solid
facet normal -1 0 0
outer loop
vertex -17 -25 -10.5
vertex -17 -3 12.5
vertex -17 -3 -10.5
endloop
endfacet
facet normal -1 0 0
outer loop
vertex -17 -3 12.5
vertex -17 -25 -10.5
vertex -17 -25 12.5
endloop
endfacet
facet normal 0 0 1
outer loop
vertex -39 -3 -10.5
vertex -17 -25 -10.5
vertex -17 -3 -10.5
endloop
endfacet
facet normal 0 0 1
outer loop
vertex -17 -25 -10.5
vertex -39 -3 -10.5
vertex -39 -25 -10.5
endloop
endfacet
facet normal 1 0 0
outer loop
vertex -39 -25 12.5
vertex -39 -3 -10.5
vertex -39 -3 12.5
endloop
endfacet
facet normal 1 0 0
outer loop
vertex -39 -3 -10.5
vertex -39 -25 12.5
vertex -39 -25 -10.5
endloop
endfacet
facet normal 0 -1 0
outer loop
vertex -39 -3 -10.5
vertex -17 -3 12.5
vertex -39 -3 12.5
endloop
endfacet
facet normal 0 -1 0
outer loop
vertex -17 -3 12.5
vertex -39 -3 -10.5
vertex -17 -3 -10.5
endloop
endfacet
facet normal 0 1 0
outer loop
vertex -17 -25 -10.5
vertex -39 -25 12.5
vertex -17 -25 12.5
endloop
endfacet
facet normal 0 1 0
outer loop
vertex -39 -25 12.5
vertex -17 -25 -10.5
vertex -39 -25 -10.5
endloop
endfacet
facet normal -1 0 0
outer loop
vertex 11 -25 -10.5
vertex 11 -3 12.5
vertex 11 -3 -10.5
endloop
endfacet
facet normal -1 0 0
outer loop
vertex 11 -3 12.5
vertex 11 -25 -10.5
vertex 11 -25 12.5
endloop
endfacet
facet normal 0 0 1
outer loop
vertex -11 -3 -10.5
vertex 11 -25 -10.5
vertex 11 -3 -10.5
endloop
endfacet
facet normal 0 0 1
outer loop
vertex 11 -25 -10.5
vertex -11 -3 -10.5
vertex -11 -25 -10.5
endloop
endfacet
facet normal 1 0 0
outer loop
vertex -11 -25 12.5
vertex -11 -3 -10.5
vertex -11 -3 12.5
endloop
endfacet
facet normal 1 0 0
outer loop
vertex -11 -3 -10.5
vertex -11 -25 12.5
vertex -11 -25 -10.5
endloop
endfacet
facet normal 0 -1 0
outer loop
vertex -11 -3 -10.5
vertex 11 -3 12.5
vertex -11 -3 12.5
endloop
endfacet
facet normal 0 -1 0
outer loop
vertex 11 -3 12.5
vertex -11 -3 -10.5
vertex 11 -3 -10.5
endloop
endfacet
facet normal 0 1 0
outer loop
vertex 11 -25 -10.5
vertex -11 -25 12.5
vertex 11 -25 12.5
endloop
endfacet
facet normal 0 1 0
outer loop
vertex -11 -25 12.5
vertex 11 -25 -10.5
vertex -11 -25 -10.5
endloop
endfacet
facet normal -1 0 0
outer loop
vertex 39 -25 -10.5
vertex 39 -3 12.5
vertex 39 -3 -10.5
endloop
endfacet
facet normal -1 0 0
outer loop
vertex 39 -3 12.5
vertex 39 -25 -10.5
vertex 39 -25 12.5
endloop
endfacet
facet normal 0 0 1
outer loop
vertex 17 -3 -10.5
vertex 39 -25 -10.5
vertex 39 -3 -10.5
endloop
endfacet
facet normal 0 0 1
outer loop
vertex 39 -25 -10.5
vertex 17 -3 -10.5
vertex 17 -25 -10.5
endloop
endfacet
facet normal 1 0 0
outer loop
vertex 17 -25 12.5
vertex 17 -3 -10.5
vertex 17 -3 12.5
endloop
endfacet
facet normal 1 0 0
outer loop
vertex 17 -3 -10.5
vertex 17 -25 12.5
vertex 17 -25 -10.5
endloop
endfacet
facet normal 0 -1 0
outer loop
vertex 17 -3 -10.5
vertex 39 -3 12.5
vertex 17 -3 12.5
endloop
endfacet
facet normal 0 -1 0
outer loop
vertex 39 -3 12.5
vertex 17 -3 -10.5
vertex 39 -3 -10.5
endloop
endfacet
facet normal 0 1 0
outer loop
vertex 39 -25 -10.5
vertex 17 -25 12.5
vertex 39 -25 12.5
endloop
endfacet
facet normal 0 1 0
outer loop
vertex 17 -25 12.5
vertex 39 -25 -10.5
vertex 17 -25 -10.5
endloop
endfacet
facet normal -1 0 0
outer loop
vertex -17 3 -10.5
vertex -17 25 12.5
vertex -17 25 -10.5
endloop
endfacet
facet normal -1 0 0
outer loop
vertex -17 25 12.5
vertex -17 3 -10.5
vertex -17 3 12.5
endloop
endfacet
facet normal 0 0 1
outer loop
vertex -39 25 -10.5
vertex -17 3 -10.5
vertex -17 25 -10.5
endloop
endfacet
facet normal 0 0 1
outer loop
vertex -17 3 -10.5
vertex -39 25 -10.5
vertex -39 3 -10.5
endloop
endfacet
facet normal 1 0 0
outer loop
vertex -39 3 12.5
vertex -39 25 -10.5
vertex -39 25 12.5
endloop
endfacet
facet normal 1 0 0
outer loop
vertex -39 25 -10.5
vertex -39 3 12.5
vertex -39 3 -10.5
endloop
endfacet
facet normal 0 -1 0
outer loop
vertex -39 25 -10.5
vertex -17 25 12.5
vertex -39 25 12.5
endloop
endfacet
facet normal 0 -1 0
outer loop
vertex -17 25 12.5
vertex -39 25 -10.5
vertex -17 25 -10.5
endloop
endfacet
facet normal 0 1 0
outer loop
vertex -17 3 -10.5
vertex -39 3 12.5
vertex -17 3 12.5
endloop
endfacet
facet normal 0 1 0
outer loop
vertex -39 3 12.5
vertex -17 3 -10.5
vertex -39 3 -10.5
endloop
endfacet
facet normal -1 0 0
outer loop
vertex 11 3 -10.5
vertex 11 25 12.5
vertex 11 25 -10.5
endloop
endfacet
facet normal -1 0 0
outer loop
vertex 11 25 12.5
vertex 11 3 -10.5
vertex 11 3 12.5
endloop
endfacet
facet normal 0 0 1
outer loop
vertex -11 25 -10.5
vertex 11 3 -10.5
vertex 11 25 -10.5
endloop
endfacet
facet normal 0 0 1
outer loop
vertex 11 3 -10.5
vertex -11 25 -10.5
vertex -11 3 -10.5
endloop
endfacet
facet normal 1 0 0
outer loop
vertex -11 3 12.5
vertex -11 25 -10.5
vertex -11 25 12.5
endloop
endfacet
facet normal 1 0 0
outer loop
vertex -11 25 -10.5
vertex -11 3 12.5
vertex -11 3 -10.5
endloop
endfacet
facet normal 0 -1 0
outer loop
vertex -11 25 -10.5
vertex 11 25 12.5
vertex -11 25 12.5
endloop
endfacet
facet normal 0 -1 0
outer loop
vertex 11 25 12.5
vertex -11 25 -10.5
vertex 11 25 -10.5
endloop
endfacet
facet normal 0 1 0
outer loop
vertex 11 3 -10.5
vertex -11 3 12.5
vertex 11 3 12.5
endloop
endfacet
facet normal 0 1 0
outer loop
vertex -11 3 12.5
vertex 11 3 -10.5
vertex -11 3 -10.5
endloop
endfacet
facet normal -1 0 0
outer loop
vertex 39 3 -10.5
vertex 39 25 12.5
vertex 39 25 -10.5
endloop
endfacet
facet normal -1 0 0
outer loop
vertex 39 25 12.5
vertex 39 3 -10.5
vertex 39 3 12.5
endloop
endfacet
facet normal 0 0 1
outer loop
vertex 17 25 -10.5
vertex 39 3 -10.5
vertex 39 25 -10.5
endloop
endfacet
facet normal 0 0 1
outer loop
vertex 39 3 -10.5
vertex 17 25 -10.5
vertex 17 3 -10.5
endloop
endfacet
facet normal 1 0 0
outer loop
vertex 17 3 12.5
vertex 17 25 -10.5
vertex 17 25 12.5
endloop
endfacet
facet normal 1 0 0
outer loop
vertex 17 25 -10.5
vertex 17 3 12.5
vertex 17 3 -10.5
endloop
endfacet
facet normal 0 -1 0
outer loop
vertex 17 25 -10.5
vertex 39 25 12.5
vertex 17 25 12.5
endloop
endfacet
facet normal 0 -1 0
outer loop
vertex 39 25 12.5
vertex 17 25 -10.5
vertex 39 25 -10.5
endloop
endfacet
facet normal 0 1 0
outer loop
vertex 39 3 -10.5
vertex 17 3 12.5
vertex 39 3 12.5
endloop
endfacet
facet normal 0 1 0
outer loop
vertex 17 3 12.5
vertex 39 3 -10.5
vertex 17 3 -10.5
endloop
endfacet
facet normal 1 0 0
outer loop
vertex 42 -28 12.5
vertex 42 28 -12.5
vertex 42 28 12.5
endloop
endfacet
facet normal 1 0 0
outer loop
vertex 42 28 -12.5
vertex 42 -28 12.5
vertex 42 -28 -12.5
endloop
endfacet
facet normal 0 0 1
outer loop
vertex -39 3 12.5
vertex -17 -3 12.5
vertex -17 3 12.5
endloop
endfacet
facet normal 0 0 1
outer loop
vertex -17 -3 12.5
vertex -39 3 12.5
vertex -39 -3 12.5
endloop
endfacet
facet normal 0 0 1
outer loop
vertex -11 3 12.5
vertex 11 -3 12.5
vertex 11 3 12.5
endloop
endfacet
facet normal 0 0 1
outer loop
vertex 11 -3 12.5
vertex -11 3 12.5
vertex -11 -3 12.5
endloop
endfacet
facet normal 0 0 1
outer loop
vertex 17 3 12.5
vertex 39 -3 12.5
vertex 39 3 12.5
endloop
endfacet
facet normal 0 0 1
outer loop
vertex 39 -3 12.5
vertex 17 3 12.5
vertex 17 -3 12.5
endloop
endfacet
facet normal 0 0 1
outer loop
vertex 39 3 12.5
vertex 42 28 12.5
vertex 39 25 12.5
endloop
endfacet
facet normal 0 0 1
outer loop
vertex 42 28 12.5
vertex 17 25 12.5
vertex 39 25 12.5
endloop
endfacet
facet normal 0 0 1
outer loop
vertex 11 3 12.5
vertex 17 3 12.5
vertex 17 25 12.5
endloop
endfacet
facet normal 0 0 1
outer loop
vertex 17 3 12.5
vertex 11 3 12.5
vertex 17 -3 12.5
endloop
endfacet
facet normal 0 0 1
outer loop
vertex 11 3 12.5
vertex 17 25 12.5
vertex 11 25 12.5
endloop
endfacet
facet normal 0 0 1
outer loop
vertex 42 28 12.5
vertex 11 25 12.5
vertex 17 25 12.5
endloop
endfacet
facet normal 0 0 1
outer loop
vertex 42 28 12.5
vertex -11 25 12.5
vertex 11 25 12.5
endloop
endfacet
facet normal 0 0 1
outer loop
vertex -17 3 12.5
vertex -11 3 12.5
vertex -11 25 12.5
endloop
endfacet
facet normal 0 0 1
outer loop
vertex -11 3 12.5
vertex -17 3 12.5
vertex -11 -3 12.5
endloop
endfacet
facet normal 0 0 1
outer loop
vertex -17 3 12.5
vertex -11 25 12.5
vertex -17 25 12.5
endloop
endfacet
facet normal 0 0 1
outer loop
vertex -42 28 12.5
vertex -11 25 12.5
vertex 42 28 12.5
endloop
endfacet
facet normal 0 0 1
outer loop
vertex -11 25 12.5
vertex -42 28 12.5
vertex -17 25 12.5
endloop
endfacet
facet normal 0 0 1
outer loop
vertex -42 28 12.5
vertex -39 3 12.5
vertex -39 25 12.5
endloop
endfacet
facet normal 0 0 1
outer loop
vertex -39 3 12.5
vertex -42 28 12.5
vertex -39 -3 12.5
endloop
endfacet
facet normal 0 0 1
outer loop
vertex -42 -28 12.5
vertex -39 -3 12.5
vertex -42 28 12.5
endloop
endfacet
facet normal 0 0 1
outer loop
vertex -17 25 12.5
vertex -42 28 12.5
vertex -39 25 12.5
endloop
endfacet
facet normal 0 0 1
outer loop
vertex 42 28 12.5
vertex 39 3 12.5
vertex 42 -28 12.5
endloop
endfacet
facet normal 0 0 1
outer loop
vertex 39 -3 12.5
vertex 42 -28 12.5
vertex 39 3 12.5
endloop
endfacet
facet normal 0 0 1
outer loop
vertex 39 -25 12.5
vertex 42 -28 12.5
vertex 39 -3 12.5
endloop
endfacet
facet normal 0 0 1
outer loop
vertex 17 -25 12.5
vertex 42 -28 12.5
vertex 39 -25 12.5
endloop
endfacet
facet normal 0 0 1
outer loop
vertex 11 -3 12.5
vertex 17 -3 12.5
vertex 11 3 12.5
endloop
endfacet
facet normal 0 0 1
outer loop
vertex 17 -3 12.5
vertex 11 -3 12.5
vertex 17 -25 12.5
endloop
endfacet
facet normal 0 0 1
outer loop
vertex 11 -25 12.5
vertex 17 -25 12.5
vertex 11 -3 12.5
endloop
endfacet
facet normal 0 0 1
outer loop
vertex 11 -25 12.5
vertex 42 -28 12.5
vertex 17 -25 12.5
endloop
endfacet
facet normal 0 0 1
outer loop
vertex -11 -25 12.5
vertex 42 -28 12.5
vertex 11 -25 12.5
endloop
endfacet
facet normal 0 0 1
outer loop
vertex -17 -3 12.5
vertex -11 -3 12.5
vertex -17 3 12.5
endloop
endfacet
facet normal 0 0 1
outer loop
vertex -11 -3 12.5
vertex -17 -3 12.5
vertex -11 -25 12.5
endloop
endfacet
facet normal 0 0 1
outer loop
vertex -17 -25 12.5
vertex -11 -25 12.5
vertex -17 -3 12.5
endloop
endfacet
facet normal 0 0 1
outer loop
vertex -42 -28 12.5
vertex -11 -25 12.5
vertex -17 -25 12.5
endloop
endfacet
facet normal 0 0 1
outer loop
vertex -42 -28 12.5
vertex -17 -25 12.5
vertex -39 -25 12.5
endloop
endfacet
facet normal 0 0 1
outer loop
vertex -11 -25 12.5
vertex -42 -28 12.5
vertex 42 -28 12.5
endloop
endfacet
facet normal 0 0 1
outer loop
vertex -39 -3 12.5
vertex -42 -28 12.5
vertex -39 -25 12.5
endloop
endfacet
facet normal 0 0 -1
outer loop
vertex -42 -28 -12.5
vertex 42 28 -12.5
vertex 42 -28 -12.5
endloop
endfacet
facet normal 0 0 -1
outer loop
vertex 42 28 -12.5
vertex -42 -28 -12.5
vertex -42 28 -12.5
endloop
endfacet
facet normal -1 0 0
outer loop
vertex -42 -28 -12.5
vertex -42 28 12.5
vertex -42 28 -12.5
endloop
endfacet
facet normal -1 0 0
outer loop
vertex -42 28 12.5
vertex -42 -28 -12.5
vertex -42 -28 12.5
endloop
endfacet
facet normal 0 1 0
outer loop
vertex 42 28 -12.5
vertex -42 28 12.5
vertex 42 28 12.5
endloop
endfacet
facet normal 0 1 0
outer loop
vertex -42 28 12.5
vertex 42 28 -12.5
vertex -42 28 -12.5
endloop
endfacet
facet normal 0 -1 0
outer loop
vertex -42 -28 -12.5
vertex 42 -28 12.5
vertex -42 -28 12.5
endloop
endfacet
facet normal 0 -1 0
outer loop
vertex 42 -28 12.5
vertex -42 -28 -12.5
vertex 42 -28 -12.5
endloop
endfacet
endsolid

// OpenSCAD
$fn = 32;

// ----------------------------------------------------------------------
// Pocket plate 84 x 56 x 25
// 2 x 3 pockets 22 mm square, 23 mm deep
// ----------------------------------------------------------------------

// --- parameters (mm) ---
thickness = 25;  // plate thickness
floor_t = 2;     // material left under each pocket
pocket = 22;     // pocket side length
pitch_x = 28;    // pocket pitch along X
pitch_y = 28;    // pocket pitch along Y
cols = 3;        // pockets per row
rows = 2;        // rows of pockets

// --- derived feature positions (mm) ---
depth = thickness - floor_t;        // = 23   pocket depth, down to the floor
span_x = (cols - 1) * pitch_x;      // = 56   distance between outer pockets
span_y = (rows - 1) * pitch_y;      // = 28   distance between outer pocket rows
origin_x = -span_x / 2;             // = -28   X of the first pocket
origin_y = -span_y / 2;             // = -14   Y of the first pocket
plate = [span_x + pocket + 6, span_y + pocket + 6, thickness];  // = [84, 56, 25]   overall size: pockets plus 3 mm of wall on each side
feature_centers = [
  [origin_x + 0 * pitch_x, origin_y + 0 * pitch_y],
  [origin_x + 1 * pitch_x, origin_y + 0 * pitch_y],
  [origin_x + 2 * pitch_x, origin_y + 0 * pitch_y],
  [origin_x + 0 * pitch_x, origin_y + 1 * pitch_y],
  [origin_x + 1 * pitch_x, origin_y + 1 * pitch_y],
  [origin_x + 2 * pitch_x, origin_y + 1 * pitch_y]
];   // pocket centres, used verbatim by the cutter loop

// plate outline, then one pocket per centre in feature_centers
difference() {
  cube(plate, center = true);
  for (centre = feature_centers)
    translate([centre[0] - pocket / 2, centre[1] - pocket / 2, plate[2] / 2 - depth])
      cube([pocket, pocket, depth + 1]);  // centred on the declared pocket centre
}
